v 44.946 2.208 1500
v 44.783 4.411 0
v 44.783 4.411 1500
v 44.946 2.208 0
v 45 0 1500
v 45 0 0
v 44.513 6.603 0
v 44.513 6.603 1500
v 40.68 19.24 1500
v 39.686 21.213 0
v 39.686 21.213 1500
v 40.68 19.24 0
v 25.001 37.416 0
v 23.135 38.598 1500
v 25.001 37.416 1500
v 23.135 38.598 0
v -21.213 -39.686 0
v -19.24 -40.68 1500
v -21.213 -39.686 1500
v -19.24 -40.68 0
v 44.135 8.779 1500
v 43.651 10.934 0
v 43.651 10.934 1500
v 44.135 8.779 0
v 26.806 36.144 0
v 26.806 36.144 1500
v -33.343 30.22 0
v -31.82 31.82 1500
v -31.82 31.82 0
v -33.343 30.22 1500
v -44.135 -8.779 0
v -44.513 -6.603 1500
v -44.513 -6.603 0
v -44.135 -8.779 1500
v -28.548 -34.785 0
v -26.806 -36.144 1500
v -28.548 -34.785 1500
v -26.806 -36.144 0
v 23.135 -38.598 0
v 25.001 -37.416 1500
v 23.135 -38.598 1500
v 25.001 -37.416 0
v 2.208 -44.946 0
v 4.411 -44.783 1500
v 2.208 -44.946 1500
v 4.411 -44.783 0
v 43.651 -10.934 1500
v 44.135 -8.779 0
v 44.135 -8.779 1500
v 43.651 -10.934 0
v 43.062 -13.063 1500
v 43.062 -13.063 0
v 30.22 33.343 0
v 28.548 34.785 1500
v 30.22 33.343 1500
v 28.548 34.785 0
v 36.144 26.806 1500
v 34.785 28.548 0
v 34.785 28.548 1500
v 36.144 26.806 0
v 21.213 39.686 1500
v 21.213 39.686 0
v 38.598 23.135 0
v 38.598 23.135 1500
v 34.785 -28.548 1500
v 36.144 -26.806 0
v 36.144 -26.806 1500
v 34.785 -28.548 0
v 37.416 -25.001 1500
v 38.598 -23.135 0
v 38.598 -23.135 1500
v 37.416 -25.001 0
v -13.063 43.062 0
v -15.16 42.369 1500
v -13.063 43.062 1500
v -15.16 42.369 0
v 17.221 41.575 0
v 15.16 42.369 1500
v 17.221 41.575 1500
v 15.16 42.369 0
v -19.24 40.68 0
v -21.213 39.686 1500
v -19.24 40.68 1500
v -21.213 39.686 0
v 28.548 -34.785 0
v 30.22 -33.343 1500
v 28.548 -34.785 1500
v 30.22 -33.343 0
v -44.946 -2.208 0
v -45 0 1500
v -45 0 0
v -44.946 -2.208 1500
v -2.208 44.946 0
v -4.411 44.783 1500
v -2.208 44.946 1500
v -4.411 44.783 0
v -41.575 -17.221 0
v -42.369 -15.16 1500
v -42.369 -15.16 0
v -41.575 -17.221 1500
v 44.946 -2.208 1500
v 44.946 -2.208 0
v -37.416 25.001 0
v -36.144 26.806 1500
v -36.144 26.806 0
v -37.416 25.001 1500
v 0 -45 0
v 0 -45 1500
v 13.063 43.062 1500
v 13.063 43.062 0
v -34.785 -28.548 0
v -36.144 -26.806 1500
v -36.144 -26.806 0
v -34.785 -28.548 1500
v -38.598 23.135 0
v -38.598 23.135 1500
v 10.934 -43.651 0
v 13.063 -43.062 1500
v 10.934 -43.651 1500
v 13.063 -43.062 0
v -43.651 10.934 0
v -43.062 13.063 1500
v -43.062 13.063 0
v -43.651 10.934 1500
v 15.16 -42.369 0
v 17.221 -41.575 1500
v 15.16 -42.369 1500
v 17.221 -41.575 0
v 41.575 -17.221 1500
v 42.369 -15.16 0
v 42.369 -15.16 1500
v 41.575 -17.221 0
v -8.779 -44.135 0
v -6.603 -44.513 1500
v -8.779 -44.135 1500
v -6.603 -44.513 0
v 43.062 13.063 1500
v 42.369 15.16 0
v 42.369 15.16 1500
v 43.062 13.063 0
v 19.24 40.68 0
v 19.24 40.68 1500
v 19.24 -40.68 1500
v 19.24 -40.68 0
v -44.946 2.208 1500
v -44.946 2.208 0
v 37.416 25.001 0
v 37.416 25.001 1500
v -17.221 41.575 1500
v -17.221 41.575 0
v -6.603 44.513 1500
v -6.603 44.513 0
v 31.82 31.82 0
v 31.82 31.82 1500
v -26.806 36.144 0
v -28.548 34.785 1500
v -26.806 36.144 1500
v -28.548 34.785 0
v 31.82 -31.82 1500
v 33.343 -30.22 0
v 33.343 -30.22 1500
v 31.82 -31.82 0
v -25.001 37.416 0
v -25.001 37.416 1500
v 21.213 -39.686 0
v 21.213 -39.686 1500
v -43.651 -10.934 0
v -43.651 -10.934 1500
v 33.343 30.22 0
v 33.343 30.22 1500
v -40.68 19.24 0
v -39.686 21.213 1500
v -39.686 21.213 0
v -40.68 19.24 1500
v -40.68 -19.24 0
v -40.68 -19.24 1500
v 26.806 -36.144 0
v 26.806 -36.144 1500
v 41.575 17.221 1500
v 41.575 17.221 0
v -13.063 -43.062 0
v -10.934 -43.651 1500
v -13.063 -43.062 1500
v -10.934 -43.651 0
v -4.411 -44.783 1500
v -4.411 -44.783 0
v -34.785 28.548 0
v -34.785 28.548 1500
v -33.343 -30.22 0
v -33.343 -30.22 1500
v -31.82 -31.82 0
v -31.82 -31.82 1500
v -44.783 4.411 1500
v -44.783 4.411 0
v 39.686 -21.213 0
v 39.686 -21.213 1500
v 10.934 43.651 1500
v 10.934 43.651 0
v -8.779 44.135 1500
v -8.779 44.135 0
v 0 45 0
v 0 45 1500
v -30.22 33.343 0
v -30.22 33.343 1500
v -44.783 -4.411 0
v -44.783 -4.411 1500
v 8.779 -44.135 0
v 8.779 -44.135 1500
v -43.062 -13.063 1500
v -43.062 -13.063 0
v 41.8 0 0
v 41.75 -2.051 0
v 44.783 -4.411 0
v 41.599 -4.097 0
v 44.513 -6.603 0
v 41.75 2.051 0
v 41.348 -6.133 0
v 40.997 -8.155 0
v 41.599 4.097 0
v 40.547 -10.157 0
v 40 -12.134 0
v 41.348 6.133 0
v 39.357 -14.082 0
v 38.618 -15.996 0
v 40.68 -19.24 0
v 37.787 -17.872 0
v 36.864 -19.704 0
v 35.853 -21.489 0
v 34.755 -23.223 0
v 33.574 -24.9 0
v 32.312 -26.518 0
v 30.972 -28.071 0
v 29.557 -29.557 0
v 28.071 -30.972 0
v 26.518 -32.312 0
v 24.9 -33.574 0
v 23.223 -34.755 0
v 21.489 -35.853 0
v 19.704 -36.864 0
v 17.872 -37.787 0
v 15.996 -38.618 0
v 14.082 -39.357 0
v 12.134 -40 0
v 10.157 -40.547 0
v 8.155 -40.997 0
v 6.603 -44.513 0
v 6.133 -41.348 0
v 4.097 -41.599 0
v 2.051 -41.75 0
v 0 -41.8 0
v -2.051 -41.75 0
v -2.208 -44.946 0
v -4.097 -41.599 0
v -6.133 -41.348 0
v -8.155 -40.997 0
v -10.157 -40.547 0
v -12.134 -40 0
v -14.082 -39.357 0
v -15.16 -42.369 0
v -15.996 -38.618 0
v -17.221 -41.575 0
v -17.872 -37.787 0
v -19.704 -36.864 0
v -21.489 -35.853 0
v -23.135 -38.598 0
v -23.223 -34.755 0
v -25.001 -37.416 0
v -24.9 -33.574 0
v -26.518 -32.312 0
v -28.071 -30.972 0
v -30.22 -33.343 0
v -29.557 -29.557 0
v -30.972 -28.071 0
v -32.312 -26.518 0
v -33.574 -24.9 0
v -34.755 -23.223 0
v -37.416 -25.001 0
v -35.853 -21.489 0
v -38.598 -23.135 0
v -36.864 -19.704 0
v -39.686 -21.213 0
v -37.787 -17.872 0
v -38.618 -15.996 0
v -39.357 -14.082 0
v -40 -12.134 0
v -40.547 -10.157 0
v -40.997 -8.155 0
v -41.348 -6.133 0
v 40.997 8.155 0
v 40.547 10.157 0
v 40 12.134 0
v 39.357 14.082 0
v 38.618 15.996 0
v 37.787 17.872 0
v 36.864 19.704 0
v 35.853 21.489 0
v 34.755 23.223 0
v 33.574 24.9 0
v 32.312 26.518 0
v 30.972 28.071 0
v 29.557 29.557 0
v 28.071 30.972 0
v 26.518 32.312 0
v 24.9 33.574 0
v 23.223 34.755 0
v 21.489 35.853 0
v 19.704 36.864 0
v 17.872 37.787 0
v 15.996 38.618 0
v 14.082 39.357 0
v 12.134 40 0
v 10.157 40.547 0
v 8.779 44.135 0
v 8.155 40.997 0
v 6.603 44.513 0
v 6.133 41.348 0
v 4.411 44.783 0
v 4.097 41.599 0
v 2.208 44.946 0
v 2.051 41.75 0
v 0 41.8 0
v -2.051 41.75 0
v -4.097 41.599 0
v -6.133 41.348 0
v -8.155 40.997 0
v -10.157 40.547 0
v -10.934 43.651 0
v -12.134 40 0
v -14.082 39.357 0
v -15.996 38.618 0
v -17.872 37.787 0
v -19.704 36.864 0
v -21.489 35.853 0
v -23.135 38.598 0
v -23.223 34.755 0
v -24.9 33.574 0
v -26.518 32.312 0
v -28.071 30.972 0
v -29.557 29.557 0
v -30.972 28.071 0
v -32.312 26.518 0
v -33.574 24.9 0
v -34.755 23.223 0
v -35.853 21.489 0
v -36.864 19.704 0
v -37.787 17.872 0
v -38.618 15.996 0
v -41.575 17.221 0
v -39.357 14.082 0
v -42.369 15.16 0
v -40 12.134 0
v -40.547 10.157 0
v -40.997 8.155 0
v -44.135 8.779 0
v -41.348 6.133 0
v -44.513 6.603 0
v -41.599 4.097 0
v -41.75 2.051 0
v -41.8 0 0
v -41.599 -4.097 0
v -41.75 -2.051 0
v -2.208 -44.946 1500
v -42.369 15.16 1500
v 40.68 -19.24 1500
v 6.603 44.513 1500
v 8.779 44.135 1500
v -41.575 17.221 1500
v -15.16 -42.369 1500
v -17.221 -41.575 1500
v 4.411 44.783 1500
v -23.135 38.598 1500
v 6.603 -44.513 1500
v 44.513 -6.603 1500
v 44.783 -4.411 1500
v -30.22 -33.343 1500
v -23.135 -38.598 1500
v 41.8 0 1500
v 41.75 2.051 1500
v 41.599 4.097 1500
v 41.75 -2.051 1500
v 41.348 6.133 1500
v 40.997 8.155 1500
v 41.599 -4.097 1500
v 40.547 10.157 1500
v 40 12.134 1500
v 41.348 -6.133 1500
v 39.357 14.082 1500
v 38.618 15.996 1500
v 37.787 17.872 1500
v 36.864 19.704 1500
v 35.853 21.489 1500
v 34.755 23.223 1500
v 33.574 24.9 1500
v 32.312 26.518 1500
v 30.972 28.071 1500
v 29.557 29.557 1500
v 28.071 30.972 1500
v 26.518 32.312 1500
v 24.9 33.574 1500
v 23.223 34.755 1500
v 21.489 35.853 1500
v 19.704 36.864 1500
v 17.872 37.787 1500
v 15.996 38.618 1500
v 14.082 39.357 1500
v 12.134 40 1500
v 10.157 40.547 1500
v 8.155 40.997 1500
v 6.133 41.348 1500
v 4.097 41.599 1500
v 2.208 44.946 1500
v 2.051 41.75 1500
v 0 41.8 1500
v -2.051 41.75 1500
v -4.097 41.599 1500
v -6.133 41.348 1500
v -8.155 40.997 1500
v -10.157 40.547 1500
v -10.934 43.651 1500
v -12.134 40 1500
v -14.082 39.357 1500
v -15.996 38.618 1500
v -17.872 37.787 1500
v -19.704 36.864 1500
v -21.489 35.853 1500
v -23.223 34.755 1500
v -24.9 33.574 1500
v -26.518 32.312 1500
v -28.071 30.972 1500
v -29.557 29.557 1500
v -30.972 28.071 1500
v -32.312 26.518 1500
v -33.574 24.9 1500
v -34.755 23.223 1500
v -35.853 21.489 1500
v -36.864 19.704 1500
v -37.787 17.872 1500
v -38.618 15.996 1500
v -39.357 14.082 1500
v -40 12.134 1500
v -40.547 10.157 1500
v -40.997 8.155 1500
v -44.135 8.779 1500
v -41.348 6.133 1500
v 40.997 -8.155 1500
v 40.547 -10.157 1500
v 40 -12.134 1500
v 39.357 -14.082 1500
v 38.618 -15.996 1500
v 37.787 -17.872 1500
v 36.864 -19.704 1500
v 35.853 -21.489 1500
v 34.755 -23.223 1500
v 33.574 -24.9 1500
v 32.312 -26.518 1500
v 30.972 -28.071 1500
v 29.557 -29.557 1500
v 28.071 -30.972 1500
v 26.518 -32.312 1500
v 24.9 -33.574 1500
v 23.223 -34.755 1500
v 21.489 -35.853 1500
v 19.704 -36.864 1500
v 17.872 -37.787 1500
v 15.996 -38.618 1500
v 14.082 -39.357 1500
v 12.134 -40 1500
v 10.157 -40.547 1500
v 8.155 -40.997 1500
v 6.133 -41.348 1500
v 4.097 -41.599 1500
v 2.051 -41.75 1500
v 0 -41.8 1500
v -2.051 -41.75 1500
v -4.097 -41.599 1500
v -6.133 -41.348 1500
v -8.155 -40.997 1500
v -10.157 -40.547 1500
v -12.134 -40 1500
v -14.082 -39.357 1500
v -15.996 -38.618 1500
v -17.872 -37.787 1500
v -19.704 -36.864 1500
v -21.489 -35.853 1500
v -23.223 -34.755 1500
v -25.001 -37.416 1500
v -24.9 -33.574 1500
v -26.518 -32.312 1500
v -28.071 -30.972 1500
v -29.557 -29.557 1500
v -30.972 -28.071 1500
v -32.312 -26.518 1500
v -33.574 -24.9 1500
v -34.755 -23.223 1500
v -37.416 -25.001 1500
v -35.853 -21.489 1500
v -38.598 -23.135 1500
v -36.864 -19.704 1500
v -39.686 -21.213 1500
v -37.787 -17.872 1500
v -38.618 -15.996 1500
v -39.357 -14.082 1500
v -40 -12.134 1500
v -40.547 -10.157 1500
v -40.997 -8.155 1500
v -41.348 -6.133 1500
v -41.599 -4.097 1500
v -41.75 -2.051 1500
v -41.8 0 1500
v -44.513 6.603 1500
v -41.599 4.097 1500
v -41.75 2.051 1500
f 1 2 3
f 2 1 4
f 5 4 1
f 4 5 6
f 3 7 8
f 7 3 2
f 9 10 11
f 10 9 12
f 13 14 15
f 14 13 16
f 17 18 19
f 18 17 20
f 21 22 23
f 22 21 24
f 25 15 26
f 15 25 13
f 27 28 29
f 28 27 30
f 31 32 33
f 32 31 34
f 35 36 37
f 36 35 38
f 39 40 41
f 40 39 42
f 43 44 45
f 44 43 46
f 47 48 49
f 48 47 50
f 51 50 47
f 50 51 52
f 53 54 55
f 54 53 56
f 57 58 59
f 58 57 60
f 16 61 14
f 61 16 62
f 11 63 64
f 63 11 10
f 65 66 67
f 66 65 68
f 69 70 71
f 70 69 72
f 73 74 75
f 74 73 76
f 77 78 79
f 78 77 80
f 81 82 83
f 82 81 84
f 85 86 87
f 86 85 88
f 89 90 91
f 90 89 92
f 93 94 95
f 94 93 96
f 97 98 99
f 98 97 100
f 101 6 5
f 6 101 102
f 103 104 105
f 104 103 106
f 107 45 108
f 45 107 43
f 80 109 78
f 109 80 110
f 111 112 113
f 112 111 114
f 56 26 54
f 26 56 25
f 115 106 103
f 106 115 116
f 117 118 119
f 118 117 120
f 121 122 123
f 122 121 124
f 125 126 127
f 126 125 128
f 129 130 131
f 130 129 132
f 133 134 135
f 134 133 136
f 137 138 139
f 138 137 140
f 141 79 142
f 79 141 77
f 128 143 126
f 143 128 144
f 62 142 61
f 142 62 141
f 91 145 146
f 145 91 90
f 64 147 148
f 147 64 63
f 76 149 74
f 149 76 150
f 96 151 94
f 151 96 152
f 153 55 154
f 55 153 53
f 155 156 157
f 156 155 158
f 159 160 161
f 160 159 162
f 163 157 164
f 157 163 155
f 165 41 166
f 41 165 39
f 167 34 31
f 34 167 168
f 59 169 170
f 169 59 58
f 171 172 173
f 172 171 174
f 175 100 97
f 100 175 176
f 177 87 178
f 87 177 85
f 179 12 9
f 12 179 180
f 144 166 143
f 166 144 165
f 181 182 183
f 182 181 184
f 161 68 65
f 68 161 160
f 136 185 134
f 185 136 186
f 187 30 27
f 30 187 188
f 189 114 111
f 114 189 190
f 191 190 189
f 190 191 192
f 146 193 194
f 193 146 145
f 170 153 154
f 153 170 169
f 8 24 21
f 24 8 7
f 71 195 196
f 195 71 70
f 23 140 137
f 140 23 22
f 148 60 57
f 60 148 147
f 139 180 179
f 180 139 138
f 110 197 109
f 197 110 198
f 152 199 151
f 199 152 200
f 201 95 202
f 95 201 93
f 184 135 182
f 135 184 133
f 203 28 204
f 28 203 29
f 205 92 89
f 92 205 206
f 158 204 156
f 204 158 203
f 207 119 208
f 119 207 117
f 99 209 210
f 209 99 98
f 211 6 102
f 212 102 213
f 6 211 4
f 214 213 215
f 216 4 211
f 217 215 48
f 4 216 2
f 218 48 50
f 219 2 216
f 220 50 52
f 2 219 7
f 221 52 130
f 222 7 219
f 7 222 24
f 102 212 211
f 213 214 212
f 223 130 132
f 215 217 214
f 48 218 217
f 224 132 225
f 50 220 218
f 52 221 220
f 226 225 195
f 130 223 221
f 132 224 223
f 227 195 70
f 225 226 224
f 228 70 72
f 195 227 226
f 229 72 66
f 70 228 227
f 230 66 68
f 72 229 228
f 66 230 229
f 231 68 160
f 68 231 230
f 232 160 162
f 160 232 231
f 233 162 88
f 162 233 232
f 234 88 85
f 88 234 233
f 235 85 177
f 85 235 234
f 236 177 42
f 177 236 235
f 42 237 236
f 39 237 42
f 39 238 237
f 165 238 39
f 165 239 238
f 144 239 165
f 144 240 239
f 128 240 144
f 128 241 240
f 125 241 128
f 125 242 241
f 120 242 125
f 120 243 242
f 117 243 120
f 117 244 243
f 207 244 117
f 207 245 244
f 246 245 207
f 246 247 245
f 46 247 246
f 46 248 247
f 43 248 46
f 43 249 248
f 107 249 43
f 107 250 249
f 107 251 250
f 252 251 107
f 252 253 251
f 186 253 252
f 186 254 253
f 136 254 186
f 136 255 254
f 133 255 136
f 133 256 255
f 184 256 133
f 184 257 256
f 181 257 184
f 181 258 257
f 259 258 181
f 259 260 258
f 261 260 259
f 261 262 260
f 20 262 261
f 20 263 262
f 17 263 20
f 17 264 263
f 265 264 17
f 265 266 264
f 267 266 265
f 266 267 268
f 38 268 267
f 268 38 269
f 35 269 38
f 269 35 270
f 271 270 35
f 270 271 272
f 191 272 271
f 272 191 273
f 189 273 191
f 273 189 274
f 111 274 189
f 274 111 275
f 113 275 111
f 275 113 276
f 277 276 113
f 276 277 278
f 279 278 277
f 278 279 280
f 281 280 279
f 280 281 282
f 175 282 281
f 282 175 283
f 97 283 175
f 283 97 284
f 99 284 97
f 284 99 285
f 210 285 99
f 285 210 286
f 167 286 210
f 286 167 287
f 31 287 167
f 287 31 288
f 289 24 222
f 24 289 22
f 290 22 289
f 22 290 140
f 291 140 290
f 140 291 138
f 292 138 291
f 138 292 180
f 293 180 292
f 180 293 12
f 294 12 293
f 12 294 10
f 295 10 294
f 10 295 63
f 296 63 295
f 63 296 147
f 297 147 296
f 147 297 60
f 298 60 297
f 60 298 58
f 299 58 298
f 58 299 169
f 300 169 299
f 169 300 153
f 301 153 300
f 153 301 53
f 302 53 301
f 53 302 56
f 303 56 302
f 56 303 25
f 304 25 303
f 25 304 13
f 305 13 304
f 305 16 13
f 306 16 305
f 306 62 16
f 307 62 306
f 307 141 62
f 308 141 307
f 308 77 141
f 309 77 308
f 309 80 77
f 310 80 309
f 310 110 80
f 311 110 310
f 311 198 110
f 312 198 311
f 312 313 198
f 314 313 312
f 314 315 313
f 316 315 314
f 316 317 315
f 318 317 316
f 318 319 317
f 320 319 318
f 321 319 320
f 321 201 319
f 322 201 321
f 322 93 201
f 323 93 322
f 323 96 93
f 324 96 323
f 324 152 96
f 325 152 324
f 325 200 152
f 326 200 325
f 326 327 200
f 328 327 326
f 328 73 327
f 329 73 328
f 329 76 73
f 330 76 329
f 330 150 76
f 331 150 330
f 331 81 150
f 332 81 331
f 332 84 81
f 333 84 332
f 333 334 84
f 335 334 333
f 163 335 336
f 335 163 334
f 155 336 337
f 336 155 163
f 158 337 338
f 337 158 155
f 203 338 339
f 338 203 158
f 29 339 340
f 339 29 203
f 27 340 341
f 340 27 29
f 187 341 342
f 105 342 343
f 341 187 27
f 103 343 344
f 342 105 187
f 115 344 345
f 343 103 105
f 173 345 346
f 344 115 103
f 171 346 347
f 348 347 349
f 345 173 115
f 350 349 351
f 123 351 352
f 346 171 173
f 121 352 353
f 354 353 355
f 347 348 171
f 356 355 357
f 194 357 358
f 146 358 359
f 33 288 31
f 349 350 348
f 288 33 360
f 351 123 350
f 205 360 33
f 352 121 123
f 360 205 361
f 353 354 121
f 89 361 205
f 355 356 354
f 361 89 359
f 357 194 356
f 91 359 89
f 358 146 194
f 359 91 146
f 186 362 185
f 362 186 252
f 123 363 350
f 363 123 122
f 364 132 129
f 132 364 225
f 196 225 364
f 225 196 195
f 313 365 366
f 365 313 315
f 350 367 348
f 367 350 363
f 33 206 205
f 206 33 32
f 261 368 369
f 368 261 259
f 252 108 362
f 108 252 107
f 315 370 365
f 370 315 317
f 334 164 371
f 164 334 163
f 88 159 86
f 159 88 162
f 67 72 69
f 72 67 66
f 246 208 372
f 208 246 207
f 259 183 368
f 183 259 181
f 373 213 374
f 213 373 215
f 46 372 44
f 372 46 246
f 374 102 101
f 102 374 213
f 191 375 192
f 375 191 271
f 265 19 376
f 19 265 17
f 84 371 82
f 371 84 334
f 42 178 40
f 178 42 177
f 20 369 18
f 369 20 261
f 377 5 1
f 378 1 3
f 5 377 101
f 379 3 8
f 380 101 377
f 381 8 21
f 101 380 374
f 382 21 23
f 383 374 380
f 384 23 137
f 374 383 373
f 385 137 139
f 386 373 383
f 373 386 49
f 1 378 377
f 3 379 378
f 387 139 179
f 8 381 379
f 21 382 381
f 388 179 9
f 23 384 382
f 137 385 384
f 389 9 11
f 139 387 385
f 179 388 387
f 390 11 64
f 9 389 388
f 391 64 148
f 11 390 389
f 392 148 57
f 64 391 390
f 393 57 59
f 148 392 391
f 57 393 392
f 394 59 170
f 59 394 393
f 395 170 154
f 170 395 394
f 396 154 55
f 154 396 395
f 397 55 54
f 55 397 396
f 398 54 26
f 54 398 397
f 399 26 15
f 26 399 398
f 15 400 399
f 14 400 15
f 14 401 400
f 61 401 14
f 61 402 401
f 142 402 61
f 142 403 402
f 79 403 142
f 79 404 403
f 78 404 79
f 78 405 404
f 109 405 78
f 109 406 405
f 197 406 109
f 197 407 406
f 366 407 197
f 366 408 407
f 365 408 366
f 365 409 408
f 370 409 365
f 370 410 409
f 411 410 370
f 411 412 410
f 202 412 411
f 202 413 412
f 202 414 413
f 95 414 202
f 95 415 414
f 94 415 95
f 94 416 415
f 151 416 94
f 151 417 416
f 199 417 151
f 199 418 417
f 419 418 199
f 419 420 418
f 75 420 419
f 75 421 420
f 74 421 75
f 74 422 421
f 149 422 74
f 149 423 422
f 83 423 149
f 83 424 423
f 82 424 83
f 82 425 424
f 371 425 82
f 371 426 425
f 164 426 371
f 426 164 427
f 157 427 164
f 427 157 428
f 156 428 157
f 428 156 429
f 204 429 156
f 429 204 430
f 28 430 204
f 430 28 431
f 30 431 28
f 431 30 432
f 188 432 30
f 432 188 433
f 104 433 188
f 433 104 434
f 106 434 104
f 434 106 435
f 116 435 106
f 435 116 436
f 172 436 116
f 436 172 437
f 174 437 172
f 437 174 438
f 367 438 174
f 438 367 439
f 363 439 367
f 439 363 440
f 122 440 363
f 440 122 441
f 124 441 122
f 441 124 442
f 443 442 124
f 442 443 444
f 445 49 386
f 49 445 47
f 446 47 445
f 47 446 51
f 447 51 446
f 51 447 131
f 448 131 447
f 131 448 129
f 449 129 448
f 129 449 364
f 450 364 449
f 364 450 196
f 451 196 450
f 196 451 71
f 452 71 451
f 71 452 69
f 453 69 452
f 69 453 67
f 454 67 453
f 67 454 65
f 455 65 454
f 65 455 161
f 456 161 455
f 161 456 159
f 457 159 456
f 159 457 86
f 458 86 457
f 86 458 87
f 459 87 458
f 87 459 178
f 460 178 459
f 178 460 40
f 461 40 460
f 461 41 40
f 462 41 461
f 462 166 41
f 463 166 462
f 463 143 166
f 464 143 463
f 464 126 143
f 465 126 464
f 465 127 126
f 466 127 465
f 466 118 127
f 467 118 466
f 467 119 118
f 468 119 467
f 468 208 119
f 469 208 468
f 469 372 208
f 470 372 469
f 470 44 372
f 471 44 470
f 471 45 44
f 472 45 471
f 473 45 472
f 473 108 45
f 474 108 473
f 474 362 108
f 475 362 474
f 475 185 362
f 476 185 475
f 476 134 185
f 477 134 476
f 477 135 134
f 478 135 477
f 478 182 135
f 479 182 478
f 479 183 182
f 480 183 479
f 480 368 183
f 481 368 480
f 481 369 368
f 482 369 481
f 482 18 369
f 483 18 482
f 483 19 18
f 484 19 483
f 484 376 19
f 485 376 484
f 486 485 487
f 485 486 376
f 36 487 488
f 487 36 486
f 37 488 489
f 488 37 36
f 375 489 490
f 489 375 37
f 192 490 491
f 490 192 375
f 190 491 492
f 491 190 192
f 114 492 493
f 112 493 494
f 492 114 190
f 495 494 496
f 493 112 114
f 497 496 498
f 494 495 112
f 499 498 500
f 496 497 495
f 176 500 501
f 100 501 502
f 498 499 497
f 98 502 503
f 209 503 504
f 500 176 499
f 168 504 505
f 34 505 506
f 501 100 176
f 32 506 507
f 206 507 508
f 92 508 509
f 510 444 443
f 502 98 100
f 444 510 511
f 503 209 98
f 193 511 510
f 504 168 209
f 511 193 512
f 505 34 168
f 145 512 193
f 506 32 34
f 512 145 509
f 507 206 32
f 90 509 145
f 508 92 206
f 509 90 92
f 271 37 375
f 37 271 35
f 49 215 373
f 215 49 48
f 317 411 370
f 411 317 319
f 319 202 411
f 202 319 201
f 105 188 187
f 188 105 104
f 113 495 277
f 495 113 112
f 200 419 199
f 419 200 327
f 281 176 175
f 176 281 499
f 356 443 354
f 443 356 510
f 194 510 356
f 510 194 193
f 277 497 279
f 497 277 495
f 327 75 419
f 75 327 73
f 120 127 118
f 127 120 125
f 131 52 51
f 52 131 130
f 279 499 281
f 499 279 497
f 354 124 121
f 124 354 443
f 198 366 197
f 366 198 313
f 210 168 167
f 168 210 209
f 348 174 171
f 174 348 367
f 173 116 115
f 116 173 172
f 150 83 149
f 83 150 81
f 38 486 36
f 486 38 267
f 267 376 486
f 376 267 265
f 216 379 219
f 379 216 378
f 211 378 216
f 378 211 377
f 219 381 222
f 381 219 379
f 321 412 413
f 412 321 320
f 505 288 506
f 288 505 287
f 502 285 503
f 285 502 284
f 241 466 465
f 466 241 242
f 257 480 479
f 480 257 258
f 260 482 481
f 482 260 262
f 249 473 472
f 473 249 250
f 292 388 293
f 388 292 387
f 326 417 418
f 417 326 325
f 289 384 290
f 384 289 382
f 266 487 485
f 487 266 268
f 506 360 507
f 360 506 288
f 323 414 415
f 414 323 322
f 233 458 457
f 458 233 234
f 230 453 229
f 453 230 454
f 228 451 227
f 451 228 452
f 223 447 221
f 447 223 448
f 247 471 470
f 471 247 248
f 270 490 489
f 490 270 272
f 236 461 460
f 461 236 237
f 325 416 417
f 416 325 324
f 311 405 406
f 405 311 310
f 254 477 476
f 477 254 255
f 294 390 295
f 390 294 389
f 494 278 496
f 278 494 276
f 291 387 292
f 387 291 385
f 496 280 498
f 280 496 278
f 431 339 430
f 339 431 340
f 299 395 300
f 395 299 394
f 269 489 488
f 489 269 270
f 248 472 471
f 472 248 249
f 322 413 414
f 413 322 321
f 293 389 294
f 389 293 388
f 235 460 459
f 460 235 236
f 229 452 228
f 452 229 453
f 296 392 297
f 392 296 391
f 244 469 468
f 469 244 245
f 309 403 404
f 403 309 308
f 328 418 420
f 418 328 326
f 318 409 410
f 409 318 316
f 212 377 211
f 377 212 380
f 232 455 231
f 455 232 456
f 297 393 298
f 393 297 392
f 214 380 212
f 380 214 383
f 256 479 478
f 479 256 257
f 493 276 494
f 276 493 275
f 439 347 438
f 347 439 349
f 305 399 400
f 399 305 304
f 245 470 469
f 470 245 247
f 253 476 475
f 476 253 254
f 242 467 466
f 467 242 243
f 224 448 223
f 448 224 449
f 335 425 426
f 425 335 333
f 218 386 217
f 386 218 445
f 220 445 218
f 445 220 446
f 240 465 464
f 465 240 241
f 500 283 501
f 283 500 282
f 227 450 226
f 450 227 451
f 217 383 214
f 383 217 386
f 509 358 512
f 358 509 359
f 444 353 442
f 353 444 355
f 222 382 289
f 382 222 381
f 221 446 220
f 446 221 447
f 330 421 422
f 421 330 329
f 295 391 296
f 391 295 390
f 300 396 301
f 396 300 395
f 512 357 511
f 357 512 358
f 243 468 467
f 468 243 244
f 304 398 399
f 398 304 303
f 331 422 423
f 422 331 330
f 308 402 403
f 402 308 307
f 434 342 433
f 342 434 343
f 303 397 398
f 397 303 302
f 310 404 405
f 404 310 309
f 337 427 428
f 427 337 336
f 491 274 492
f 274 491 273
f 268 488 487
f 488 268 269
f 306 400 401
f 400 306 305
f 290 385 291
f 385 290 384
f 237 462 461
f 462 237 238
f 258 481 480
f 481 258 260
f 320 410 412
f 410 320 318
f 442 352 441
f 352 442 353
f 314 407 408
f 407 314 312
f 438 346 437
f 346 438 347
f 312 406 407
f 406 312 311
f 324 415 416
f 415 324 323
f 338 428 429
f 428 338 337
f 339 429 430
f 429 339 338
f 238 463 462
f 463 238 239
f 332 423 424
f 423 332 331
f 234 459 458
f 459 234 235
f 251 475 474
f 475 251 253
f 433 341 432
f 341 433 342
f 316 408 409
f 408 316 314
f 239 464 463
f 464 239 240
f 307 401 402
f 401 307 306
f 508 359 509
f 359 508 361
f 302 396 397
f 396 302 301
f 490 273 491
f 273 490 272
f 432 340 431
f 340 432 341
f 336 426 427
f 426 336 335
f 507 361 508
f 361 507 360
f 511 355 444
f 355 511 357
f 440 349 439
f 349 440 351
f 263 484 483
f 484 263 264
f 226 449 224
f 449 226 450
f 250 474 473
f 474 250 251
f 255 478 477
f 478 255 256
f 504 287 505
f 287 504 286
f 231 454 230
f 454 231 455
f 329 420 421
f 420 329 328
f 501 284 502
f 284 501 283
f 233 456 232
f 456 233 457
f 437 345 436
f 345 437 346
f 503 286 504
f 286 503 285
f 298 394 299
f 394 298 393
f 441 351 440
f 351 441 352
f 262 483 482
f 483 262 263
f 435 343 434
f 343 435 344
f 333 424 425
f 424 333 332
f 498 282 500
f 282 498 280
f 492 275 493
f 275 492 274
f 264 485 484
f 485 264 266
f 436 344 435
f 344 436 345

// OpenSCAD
$fn = 128;

// HT 90 pipe, length 1500 mm (simple hollow cylinder model)
pipe_length = 1500;      // mm
outer_diameter = 90;     // mm (nominal)
wall_thickness = 3.2;    // mm (typical HT wall; adjust if needed)

outer_r = outer_diameter/2;
inner_r = outer_r - wall_thickness;

module ht_pipe(len, ro, ri) {
    difference() {
        cylinder(h=len, r=ro, center=false);
        translate([0,0,-0.1]) cylinder(h=len+0.2, r=ri, center=false);
    }
}

ht_pipe(pipe_length, outer_r, inner_r);
